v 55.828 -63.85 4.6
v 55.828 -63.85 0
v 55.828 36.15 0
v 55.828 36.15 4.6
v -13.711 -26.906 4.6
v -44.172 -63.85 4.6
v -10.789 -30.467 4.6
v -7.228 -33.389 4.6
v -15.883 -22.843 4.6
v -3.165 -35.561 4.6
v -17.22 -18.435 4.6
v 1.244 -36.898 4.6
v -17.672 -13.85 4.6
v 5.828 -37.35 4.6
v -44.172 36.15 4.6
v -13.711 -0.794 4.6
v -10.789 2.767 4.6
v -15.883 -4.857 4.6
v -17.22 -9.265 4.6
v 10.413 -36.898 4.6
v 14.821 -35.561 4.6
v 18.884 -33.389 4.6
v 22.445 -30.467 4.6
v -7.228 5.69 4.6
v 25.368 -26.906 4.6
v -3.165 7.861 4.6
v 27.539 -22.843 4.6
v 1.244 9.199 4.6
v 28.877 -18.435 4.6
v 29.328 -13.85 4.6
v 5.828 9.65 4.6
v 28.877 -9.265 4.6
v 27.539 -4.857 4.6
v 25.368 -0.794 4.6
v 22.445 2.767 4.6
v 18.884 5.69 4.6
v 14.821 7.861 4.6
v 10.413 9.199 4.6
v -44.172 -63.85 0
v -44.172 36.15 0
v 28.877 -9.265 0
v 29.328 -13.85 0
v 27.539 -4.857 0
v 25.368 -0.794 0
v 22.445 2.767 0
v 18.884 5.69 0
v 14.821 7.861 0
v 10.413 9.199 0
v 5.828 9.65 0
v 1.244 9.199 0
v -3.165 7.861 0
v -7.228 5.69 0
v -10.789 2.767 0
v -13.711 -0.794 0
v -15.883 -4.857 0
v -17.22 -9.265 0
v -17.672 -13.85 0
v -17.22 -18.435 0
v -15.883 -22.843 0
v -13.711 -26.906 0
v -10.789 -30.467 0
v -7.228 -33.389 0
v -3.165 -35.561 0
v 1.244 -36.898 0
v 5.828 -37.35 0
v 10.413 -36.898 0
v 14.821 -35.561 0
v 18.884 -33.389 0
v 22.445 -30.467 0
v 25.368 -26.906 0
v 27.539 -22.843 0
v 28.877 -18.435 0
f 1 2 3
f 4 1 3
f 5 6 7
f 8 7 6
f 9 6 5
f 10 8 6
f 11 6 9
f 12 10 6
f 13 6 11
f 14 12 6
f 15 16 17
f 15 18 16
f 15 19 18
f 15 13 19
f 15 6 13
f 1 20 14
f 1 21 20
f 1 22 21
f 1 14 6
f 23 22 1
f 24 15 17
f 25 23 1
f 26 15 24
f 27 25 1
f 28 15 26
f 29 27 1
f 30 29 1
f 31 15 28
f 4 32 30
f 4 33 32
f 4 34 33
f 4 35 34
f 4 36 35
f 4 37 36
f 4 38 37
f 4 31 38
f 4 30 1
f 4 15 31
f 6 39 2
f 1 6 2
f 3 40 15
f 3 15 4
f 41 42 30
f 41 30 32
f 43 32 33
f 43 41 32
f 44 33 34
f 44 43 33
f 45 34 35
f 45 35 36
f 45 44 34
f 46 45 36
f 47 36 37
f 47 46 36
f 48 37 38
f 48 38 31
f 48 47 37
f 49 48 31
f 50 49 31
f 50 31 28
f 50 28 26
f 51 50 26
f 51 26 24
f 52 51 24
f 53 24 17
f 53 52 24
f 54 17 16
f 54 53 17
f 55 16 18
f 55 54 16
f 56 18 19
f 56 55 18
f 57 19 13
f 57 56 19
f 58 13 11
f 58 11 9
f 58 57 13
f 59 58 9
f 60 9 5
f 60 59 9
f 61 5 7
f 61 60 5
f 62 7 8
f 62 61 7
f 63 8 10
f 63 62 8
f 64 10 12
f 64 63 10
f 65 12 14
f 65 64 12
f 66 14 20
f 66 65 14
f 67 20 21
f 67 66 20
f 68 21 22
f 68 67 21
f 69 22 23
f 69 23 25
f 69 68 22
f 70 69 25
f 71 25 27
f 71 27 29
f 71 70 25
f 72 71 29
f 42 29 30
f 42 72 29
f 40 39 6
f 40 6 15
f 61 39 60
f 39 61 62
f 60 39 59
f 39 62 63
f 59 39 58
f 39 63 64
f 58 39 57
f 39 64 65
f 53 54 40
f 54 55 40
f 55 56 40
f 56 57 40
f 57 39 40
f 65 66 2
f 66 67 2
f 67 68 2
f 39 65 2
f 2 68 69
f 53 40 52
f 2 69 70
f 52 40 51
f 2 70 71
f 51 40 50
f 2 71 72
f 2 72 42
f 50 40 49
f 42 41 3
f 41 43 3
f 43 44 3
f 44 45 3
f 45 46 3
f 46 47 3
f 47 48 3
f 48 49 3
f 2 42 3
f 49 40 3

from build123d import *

# Parameters (mm, degrees)
ESQUISSE1_W        = 100
ESQUISSE1_H        = 100
ESQUISSE1_R        = 23.5
BOSS_EXTRU_1_DEPTH = 4.6


with BuildPart() as part:
    # Esquisse1 → Boss.-Extru.1 (new body)
    with BuildSketch(Plane.XY):
        with Locations((5.828319543, -13.849884125)):
            Rectangle(ESQUISSE1_W, ESQUISSE1_H)
        with Locations((5.828319543, -13.849884125)):
            Circle(ESQUISSE1_R, mode=Mode.SUBTRACT)
    extrude(amount=BOSS_EXTRU_1_DEPTH)


solid = part.part
